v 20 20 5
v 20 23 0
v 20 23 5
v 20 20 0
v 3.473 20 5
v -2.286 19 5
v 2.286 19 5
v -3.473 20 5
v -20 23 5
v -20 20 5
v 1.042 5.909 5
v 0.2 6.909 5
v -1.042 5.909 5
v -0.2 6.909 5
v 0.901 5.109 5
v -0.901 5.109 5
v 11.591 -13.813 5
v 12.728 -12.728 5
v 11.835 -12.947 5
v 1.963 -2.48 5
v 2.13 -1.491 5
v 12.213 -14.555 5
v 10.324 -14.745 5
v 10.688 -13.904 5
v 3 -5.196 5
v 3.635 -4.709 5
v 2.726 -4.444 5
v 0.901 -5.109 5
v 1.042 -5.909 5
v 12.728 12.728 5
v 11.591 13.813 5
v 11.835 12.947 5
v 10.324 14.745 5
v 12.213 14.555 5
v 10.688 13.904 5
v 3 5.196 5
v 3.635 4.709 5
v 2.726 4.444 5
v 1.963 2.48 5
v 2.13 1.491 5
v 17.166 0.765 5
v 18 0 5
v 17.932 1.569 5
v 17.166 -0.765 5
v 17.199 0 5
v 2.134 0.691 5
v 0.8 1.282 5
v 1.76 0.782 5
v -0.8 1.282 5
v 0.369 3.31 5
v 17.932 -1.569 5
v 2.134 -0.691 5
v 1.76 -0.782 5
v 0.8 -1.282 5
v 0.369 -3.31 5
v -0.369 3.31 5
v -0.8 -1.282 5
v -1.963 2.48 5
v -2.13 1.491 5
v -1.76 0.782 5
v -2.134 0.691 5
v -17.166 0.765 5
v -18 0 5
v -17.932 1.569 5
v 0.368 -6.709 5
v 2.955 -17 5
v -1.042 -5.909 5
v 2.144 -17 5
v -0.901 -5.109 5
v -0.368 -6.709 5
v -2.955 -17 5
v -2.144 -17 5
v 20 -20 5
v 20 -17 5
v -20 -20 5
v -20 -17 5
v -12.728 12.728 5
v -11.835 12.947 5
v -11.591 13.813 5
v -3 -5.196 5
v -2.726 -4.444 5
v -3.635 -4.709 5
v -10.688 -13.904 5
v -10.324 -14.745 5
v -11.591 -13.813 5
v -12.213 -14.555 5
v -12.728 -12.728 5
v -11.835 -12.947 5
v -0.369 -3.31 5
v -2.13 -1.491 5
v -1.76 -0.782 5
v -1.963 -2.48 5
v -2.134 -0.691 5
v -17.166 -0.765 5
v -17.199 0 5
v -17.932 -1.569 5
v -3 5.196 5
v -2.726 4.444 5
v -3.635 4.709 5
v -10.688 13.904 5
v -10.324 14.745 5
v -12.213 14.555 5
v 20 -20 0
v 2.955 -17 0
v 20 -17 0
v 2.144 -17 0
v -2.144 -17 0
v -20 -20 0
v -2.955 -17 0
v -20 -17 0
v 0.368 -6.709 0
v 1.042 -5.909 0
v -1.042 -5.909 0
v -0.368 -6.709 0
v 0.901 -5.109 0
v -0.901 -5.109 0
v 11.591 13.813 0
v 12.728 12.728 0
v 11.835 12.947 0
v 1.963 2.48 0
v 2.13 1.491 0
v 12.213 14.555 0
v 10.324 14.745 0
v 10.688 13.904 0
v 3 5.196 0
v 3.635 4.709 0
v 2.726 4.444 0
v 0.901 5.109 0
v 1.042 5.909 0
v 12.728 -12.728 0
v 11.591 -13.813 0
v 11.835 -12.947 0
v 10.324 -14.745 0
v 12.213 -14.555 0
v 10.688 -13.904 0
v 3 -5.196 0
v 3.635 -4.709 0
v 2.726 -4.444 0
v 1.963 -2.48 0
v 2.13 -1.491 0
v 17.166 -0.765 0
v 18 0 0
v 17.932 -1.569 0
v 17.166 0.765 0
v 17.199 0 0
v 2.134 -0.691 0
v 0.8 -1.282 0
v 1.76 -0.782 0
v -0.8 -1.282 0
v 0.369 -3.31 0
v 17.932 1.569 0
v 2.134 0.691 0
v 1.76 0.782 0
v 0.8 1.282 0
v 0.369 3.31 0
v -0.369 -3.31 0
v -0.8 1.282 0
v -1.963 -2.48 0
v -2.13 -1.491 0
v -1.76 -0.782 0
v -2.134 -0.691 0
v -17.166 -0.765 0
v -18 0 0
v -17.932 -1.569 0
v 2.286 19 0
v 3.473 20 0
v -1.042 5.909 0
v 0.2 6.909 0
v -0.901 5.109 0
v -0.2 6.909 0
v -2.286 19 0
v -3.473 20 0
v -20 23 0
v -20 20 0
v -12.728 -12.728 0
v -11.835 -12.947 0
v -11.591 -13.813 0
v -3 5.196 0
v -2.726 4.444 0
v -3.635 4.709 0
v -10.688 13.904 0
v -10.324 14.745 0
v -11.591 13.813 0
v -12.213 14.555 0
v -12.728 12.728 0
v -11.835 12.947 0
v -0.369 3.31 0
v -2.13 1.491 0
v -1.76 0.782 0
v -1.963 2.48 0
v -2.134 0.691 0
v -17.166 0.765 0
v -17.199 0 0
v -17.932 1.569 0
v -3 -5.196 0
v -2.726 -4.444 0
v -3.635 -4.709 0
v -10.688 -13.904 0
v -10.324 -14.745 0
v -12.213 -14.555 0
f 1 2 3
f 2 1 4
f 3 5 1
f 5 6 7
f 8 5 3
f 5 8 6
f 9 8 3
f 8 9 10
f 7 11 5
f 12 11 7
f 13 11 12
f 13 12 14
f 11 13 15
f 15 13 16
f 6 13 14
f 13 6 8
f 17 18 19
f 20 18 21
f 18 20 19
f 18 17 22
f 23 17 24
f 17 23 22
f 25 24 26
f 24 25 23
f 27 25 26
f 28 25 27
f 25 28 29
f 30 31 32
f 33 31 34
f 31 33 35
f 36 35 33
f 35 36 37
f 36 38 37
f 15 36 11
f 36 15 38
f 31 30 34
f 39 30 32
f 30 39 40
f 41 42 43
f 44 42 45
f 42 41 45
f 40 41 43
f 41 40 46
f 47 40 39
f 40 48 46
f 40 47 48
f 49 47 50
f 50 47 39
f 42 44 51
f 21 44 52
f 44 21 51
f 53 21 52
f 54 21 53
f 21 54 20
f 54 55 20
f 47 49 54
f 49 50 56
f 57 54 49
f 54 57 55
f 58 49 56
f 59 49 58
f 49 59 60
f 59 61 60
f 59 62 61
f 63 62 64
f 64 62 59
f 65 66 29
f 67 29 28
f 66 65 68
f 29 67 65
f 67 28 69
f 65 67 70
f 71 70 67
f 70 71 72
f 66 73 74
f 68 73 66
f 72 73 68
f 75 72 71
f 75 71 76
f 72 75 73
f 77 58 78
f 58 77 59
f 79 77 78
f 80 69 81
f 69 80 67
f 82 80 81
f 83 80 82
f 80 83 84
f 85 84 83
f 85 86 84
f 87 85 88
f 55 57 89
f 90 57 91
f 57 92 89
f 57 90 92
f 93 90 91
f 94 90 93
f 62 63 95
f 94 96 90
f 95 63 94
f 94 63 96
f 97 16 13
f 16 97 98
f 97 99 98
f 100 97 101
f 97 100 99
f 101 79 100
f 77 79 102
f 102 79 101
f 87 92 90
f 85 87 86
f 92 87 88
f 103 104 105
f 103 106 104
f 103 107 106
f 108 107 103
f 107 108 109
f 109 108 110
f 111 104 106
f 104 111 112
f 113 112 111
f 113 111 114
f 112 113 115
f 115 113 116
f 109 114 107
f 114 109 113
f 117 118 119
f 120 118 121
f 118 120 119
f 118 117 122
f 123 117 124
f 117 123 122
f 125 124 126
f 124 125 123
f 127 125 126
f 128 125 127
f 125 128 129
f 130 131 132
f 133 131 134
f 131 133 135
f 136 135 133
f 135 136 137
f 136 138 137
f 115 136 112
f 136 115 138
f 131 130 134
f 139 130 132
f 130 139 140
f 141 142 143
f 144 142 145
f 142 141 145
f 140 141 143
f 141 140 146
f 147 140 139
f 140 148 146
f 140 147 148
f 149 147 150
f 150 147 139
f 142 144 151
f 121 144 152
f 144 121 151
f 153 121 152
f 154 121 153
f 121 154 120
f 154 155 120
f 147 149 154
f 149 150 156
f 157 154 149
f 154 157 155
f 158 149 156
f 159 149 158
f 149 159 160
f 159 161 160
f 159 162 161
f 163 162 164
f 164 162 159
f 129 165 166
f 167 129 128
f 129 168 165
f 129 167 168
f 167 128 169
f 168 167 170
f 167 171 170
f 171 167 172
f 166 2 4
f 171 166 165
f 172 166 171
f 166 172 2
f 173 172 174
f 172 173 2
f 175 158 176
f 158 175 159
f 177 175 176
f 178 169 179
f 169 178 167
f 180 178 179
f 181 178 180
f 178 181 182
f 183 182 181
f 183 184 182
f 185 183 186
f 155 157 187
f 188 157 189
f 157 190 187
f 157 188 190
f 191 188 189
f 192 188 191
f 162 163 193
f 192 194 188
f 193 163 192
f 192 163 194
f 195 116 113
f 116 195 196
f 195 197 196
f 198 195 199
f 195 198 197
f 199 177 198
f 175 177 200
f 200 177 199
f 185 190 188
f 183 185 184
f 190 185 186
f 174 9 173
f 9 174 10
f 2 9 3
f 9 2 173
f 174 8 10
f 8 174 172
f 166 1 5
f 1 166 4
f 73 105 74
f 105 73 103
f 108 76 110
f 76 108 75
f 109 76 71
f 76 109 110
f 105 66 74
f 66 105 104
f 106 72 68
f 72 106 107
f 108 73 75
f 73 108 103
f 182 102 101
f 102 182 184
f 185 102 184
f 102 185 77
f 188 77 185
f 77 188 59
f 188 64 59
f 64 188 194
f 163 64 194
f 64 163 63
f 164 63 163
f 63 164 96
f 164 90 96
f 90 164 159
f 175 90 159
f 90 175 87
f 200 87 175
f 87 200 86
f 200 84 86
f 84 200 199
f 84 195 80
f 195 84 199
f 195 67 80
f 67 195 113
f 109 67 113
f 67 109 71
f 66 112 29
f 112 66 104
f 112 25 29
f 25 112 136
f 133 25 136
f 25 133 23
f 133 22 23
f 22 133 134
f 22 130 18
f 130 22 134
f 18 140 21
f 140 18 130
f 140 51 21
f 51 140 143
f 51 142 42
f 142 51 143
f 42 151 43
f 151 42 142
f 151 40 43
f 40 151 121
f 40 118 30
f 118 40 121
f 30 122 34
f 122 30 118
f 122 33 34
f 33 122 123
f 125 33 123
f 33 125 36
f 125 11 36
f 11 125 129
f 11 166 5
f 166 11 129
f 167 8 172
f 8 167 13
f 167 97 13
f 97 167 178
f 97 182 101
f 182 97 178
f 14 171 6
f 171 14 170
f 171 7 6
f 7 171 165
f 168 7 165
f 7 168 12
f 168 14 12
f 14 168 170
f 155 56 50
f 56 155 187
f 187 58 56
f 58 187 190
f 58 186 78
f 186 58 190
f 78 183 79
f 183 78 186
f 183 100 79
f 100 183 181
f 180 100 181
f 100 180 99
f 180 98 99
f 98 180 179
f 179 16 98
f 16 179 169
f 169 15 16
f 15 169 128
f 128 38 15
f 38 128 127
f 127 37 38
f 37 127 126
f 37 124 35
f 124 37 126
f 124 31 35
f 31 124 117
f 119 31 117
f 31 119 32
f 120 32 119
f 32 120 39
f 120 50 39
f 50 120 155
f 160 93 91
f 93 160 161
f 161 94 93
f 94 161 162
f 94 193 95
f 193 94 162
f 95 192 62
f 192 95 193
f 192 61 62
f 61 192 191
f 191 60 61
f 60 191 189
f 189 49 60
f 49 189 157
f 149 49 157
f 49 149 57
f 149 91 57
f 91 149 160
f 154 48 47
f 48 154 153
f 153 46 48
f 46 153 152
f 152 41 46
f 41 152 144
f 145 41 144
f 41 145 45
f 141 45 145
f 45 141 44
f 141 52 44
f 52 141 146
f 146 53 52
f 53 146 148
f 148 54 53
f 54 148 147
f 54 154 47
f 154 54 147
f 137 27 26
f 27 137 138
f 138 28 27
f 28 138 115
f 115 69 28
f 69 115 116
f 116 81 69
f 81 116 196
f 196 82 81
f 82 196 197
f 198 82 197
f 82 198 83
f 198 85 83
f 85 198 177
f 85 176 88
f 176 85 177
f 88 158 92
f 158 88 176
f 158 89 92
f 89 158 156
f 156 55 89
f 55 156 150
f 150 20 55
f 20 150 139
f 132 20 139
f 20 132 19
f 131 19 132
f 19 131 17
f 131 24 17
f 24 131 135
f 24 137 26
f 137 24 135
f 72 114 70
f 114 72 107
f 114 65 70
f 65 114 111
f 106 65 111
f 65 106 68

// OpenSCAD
//https://scholarsarchive.byu.edu/cgi/viewcontent.cgi?article=2562&context=facpub

R = 20;
_t = 0.8;

translate([-R, R, 0]) {
    cube([2*R, 3, 5]);
}

translate([-R, -R, 0]) {
    cube([2*R, 3, 5]);
}

linear_extrude(height=5) {
    
    
    
    Flex16();
}

module Flex16() {

    //      1   2        3       4       5       6       7       8
    f = [0, 1,  0.30,    0.90,   1.00,   0.95,   0.90,   0.13,   0.90];

    //      1   2   3   4   5   6   7       
    a = [0, 10, 30, 35, 40, 45, 55, 85];

    k = [
            [0, 0],
            [0, 0], //1
            [0, R], //2
            [-f[1]*R*sin(a[1]), R], //3
            [-f[2]*R*sin(a[1]), f[2]*R*cos(a[1])],  //3
            [-f[2]*R*sin(a[2]), f[2]*R*cos(a[2])],  //4
            [-f[3]*R*sin(a[3]), f[3]*R*cos(a[3])],  //5
            [-f[4]*R*sin(a[4]), R],
            [-f[5]*R*sin(a[4]), f[5]*R*cos(a[4])],
            [-f[6]*R*sin(a[5]), f[6]*R*cos(a[5])],
            [-f[7]*R*sin(a[6]), f[7]*R*cos(a[6])],
            [-f[8]*R*sin(a[7]), f[8]*R*cos(a[7])],
            [-f[8]*R, 0],
            [0, -R],
            [-f[1]*R*sin(a[1]), -R],
            [-f[2]*R*sin(a[1]), -f[2]*R*cos(a[1])],
            [-f[2]*R*sin(a[2]), -f[2]*R*cos(a[2])],
            [-f[3]*R*sin(a[3]), -f[3]*R*cos(a[3])],
            [-f[4]*R*sin(a[3]), -R],
            [-f[5]*R*sin(a[4]), -f[5]*R*cos(a[4])],
            [-f[6]*R*sin(a[5]), -f[6]*R*cos(a[5])],
            [-f[7]*R*sin(a[6]), -f[7]*R*cos(a[6])],
            [-f[8]*R*sin(a[7]), -f[8]*R*cos(a[7])],
            [f[1]*R*sin(a[1]), R],
            [f[2]*R*sin(a[1]), f[2]*R*cos(a[1])],

            [f[2]*R*sin(a[2]), f[2]*R*cos(a[2])],
            [f[3]*R*sin(a[3]), f[3]*R*cos(a[3])],
            [f[4]*R*sin(a[3]), R],
            [f[5]*R*sin(a[4]), f[5]*R*cos(a[4])],
            [f[6]*R*sin(a[5]), f[6]*R*cos(a[5])],
            [f[7]*R*sin(a[6]), f[7]*R*cos(a[6])],
            [f[8]*R*sin(a[7]), f[8]*R*cos(a[7])],
            [f[8]*R, 0],
            [f[1]*R*sin(a[1]), -R],
            [f[2]*R*sin(a[1]), -f[2]*R*cos(a[1])],
            [f[2]*R*sin(a[2]), -f[2]*R*cos(a[2])],
            [f[3]*R*sin(a[3]), -f[3]*R*cos(a[3])],
            [f[4]*R*sin(a[3]), -R],
            [f[5]*R*sin(a[4]), -f[5]*R*cos(a[4])],
            [f[6]*R*sin(a[5]), -f[6]*R*cos(a[5])],
            [f[7]*R*sin(a[6]), -f[7]*R*cos(a[6])],
            [f[8]*R*sin(a[7]), -f[8]*R*cos(a[7])],
            [-f[7]*R*sin(a[7]), f[7]*R*cos(a[7])],
            [f[7]*R*sin(a[7]), f[7]*R*cos(a[7])],
            [-f[7]*R*sin(a[7]), -f[7]*R*cos(a[7])],
            [f[7]*R*sin(a[7]), -f[7]*R*cos(a[7])],
            [0, f[7]*R],
            [0, -f[7]*R]
    ];



    union() {
        polygon_offset(k, [[03, 04, 24, 23, 02]], -1);

        polygon_offset(k, [[04, 05, 06, 08, 09, 10, 46, 30, 29, 28, 26, 25, 24]], -_t);

        //polygon_offset(k, [[10, 11, 12, 22, 21, 47, 40, 41, 32, 31, 30, 46]], -_t);
        polygon_offset(k, [[46, 10, 11, 12, 22, 21, 47]], -_t);
        polygon_offset(k, [[47, 40, 41, 32, 31, 30, 46]], -_t);

        polygon_offset(k, [[21, 20, 19, 17, 16, 15, 34, 35, 36, 38, 39, 40, 47]], -_t);

        polygon_offset(k, [[15, 14, 13, 33, 34]], -_t);
    }

    module polygon_offset(a, b, x) {
        difference() {
            polygon(a, b);
            offset(x) polygon(a, b);
        }
    }
}
